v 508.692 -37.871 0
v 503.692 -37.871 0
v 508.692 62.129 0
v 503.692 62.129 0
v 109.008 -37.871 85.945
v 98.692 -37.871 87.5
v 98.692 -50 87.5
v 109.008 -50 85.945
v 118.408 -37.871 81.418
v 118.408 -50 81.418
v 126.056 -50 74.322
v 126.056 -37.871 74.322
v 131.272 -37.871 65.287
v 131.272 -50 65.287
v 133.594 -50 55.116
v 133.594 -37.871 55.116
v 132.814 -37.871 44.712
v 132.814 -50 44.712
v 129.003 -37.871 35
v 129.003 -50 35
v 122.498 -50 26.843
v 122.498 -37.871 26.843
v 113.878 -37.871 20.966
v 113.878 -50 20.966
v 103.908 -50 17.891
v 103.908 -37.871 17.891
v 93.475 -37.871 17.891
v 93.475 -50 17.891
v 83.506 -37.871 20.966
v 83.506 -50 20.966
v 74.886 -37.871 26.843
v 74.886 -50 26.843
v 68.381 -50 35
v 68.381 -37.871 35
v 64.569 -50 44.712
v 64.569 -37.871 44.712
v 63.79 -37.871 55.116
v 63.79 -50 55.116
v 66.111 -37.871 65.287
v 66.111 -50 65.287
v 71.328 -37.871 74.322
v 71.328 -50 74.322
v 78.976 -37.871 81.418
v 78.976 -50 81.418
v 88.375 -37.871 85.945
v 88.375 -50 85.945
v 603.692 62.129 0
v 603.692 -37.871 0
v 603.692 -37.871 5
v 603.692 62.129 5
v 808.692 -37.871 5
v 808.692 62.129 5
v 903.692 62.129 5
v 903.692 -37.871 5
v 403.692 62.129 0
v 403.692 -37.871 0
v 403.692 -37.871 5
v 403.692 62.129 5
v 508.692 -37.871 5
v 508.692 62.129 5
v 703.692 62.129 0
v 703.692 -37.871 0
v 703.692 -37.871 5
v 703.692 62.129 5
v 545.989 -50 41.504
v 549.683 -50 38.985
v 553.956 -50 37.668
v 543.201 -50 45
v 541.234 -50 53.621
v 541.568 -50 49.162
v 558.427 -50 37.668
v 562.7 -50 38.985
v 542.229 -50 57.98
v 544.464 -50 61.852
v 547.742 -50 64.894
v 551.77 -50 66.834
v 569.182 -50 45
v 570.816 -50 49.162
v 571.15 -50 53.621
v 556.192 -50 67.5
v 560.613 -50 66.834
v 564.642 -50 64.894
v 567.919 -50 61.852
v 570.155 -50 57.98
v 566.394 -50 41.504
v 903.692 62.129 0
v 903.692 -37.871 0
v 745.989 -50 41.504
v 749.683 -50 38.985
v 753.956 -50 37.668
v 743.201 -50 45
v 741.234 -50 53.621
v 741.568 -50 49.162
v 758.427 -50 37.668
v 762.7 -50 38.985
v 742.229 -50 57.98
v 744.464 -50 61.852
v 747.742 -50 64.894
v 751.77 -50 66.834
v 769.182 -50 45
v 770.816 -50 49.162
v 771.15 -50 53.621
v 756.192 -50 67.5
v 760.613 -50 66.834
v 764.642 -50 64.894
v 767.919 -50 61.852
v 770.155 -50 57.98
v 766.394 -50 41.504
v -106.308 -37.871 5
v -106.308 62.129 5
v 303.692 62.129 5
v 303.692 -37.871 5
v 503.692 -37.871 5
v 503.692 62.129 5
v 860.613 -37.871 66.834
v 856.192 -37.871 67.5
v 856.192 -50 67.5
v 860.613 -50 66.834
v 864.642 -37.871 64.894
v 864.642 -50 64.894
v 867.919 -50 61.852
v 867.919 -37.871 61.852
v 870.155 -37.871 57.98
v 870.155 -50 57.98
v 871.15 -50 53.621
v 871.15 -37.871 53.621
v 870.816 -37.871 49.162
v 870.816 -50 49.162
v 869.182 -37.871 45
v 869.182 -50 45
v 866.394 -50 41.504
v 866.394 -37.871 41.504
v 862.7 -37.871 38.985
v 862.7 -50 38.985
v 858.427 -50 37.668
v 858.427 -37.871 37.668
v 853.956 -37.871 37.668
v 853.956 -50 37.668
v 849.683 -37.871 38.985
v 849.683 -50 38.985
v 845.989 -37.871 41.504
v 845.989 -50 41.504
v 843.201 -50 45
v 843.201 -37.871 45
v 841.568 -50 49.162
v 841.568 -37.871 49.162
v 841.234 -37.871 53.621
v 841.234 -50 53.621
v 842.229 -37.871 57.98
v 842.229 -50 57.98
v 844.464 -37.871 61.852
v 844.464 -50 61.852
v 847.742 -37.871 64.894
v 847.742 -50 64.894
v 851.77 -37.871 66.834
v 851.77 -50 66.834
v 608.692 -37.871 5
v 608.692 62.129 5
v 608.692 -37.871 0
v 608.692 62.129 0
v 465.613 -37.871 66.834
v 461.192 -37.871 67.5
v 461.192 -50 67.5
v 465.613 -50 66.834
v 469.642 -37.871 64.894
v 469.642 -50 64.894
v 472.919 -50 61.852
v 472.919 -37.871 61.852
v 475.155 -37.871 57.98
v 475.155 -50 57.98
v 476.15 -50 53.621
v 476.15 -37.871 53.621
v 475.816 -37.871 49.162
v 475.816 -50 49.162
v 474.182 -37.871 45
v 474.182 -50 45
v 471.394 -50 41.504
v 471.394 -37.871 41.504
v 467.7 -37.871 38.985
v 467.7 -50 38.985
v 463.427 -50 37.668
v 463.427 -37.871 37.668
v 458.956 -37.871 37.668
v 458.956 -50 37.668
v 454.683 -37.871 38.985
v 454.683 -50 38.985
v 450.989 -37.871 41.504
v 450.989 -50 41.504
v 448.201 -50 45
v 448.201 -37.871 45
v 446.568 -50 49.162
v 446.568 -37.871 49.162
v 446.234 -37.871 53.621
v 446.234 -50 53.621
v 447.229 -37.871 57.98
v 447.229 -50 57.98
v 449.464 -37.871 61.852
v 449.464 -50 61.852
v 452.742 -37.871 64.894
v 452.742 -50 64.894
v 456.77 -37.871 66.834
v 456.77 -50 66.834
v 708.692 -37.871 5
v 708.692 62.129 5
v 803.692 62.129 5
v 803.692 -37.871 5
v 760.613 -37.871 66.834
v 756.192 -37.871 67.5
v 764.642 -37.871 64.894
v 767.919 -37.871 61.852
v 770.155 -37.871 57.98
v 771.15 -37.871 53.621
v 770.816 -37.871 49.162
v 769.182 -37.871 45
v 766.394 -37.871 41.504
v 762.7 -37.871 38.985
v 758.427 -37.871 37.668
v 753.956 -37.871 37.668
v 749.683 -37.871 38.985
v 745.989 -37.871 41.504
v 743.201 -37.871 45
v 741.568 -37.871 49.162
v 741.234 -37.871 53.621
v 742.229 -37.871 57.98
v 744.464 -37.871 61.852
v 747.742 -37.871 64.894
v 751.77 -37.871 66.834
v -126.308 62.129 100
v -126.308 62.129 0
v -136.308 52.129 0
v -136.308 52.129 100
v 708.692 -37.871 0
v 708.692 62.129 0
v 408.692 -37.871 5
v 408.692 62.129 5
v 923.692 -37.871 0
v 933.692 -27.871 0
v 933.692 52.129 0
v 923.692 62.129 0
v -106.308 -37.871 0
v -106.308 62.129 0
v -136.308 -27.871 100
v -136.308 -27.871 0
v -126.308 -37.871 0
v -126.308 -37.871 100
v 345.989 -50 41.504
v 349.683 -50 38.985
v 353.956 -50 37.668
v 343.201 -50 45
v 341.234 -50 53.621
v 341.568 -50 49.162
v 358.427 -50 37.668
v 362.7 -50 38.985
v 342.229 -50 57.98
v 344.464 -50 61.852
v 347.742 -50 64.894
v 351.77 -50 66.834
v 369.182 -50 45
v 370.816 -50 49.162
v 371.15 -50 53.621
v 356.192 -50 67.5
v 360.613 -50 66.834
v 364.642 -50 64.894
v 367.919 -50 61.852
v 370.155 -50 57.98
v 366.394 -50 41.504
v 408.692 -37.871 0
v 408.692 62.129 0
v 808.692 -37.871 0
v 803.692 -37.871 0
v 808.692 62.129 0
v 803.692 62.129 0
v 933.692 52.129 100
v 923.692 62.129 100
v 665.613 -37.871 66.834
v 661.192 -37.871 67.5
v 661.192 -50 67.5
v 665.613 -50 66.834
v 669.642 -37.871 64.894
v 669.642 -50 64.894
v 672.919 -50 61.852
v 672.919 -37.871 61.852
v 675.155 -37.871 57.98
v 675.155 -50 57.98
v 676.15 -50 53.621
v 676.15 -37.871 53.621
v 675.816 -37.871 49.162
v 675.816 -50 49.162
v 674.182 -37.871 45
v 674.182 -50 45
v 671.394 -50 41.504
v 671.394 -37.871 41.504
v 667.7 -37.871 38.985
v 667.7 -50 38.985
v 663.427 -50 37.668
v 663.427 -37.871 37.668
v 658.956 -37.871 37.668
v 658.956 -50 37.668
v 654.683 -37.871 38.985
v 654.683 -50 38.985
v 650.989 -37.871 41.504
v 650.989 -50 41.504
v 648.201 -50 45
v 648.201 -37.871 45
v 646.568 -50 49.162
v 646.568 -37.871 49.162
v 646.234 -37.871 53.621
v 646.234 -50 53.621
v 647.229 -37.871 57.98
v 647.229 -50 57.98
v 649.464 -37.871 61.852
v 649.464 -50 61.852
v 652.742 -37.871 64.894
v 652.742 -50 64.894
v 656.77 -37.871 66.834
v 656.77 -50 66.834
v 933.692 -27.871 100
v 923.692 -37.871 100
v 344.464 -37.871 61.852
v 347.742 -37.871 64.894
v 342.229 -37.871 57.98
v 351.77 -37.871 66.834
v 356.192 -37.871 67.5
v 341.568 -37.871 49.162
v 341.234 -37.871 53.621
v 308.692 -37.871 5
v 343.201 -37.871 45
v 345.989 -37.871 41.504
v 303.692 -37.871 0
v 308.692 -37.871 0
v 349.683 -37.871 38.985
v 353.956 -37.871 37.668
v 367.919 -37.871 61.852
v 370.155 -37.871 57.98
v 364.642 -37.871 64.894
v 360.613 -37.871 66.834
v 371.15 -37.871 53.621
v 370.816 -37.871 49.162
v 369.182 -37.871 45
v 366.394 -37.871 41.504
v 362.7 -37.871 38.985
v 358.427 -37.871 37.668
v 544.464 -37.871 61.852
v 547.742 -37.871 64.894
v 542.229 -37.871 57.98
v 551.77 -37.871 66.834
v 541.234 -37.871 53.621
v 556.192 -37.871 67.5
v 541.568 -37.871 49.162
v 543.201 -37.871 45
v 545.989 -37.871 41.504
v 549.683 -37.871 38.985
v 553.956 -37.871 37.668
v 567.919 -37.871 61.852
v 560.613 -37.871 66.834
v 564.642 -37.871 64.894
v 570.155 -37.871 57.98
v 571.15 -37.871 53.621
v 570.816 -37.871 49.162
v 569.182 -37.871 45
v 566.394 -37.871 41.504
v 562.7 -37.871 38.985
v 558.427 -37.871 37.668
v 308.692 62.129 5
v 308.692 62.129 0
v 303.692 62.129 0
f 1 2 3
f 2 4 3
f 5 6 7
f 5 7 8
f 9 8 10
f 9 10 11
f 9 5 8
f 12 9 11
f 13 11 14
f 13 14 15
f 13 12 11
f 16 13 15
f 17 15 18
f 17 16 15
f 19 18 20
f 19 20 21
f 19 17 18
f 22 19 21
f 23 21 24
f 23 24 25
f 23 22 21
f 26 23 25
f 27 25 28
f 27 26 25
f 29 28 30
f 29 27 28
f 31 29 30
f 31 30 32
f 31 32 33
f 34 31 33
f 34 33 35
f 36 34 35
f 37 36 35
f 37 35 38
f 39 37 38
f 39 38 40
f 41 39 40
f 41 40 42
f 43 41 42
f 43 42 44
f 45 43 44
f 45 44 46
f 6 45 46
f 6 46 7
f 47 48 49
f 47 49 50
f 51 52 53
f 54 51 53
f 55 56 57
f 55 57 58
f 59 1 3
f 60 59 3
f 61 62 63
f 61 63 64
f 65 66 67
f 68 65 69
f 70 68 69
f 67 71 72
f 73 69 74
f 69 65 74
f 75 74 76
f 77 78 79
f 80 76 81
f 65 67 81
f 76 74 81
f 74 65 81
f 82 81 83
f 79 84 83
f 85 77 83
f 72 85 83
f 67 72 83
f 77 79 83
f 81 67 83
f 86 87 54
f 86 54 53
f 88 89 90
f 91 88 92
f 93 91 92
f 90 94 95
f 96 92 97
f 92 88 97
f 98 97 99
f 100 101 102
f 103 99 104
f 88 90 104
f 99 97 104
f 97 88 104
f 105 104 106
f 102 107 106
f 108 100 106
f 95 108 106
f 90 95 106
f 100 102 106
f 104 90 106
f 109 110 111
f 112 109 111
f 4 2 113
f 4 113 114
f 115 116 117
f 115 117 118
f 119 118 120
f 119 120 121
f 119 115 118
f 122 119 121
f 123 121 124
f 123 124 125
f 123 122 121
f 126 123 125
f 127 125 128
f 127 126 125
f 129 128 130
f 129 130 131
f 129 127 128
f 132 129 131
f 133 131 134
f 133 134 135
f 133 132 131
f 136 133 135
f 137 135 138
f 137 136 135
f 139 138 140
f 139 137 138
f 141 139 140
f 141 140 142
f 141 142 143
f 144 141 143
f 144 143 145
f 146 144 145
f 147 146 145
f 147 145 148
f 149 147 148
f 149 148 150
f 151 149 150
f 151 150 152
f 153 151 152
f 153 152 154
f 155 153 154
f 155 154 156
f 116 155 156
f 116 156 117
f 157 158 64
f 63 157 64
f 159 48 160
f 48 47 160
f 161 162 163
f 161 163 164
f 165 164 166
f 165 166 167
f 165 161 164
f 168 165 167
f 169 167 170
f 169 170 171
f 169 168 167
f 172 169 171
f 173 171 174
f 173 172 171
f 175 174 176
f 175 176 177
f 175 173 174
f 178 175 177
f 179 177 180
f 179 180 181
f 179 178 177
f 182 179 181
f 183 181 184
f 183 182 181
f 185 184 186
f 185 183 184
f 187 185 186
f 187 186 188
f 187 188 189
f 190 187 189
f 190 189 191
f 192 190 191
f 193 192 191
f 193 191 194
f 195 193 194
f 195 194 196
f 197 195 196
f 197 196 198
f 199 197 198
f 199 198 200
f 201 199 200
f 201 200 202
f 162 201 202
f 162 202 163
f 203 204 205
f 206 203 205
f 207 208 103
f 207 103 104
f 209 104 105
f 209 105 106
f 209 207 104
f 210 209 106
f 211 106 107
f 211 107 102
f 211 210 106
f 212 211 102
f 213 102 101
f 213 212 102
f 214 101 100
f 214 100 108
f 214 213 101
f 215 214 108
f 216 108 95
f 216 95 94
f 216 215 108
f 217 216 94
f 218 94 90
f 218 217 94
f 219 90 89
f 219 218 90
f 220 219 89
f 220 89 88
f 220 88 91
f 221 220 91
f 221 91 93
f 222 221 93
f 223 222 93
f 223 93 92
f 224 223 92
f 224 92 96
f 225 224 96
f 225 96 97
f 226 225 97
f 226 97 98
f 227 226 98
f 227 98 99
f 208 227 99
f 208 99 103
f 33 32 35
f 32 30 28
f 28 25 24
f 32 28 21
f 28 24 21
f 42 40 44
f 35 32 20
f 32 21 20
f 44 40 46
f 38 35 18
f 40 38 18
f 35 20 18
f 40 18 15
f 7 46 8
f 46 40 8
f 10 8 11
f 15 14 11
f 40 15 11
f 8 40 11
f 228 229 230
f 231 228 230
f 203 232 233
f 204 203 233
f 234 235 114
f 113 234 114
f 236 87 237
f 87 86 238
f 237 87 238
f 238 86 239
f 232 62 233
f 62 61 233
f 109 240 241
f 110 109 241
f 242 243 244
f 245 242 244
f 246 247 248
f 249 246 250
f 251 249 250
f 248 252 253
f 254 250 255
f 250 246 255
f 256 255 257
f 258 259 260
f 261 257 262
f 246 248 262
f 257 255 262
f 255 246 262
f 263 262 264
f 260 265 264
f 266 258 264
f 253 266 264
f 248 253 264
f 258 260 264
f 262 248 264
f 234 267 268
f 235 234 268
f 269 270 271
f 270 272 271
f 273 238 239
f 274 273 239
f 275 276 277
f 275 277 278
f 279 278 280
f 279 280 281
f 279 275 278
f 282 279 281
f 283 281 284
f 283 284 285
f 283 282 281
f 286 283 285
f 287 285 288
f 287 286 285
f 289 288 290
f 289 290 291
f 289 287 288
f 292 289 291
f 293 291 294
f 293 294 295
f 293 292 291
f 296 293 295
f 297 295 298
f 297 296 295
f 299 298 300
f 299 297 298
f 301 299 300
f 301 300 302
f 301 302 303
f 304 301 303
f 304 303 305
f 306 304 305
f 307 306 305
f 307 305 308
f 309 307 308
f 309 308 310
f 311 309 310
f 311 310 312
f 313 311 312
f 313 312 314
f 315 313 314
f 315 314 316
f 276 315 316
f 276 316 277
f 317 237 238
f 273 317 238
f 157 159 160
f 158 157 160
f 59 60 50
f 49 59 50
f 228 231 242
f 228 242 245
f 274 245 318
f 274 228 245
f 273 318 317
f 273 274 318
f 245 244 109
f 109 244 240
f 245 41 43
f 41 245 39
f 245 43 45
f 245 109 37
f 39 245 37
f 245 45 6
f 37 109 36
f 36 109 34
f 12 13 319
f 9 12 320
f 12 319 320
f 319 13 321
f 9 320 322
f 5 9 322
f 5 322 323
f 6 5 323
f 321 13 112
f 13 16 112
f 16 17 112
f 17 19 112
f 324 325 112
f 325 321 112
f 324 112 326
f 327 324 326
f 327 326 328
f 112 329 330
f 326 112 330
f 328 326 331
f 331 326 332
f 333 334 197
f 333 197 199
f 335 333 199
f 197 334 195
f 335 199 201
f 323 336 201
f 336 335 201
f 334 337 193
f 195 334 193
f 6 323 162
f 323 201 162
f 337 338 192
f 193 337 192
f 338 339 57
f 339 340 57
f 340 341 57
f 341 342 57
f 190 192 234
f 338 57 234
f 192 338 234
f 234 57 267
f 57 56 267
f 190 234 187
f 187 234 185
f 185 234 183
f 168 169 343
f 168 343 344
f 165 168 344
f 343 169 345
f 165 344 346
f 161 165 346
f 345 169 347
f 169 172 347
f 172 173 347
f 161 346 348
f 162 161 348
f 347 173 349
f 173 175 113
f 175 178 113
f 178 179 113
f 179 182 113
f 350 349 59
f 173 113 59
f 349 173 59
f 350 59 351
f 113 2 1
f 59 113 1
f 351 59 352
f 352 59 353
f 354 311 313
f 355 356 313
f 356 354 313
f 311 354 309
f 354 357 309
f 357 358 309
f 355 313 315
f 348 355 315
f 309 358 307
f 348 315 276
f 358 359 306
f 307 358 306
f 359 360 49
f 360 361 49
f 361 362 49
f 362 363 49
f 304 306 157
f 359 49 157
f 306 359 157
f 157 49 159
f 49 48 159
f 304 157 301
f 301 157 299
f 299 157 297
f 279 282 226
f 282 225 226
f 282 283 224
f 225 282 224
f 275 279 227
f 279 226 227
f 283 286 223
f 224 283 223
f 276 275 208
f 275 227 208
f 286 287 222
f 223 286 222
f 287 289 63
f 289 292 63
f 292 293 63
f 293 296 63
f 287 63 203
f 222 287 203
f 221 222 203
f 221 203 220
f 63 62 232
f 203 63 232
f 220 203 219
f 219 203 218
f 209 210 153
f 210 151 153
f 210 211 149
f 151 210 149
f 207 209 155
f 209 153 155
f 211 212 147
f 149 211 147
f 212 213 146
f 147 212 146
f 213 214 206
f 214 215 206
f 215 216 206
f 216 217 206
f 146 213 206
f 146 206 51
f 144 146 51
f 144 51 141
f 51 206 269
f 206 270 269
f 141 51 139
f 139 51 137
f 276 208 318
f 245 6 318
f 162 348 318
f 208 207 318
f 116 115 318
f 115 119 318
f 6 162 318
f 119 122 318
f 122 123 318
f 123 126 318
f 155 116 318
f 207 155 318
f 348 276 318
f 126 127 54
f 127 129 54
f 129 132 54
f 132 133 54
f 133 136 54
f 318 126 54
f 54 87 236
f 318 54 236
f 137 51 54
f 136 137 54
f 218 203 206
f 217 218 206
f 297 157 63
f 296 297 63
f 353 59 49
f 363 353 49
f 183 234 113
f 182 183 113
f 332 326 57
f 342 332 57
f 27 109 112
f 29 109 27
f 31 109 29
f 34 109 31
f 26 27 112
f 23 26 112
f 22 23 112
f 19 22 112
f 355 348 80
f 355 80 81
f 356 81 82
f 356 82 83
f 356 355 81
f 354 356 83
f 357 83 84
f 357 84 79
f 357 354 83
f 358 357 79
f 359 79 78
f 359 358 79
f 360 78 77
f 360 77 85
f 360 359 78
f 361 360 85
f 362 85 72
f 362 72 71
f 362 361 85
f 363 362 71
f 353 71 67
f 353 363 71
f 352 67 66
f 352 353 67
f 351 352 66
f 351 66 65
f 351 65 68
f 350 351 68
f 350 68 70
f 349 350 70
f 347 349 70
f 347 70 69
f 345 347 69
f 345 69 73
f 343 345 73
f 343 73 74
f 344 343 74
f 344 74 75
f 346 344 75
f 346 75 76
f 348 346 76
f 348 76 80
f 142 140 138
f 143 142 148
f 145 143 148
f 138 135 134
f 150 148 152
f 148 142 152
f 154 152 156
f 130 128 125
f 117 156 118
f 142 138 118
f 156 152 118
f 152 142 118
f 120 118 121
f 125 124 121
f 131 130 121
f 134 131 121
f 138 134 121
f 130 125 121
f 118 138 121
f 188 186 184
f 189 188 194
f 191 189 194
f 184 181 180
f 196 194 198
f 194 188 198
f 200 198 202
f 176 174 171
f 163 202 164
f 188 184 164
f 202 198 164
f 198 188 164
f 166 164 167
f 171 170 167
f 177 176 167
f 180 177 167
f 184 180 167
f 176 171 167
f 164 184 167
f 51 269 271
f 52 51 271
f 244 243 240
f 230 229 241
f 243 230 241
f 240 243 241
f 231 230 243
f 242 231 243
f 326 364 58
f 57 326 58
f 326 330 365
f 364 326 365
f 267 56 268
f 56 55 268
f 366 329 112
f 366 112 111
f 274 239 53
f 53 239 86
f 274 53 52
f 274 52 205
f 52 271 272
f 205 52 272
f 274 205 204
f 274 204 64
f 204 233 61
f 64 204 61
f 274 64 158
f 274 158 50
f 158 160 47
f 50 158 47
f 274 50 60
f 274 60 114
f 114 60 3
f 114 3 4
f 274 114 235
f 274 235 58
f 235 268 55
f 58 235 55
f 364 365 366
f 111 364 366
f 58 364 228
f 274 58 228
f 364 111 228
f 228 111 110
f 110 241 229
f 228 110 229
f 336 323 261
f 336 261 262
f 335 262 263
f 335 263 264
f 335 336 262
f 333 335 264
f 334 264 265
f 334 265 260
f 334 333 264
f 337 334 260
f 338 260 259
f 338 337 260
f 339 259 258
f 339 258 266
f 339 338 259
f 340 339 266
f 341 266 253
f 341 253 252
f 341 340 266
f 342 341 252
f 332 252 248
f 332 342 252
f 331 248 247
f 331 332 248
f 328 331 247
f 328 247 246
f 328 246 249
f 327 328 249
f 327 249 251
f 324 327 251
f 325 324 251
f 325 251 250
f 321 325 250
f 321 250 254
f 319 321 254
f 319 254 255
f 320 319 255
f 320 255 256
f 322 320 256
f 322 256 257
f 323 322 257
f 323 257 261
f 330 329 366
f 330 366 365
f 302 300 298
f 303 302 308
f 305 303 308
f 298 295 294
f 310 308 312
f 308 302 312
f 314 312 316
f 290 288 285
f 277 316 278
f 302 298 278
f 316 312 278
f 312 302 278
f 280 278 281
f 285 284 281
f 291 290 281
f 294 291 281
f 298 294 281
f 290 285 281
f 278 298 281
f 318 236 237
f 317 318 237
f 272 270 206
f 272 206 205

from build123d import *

# Parameters (mm, degrees)
CROQUIS1_W              = 100
CROQUIS1_H              = 100
SALIENTE_EXTRUIR2_DEPTH = 100
CROQUIS2_W              = 410
CROQUIS2_H              = 100
CROQUIS2_W_2            = 95
CORTAR_EXTRUIR2_DEPTH   = 5
CROQUIS3_R              = 15
CROQUIS3_R_2            = 35
SALIENTE_EXTRUIR3_DEPTH = 50


with BuildPart() as part:
    # Croquis1 → Saliente-Extruir2 (new body)
    with BuildSketch(Plane.XY):
        Polygon((793.691747165, 62.128712871), (793.691747165, -37.871287129), (893.691747165, -37.871287129), (923.691747165, -37.871287129), (933.691747165, -27.871287129), (933.691747165, 52.128712871), (923.691747165, 62.128712871), (893.691747165, 62.128712871), align=None)
        with Locations((743.691747165, 12.128712871)):
            Rectangle(CROQUIS1_W, CROQUIS1_H)
        with Locations((643.691747165, 12.128712871)):
            Rectangle(CROQUIS1_W, CROQUIS1_H)
        with Locations((543.691747165, 12.128712871)):
            Rectangle(CROQUIS1_W, CROQUIS1_H)
        with Locations((443.691747165, 12.128712871)):
            Rectangle(CROQUIS1_W, CROQUIS1_H)
        with Locations((343.691747165, 12.128712871)):
            Rectangle(CROQUIS1_W, CROQUIS1_H)
        Polygon((-126.308252835, -37.871287129), (-106.308252835, -37.871287129), (293.691747165, -37.871287129), (293.691747165, 62.128712871), (-106.308252835, 62.128712871), (-126.308252835, 62.128712871), (-136.308252835, 52.128712871), (-136.308252835, -27.871287129), align=None)
    extrude(amount=SALIENTE_EXTRUIR2_DEPTH)

    # Croquis2 → Cortar-Extruir2 (cut)
    with BuildSketch(Plane.XY):
        with Locations((98.691747165, 12.128712871)):
            Rectangle(CROQUIS2_W, CROQUIS2_H)
        with Locations((856.191747165, 12.128712871)):
            Rectangle(CROQUIS2_W_2, CROQUIS2_H)
        with Locations((756.191747165, 12.128712871)):
            Rectangle(CROQUIS2_W_2, CROQUIS2_H)
        with Locations((656.191747165, 12.128712871)):
            Rectangle(CROQUIS2_W_2, CROQUIS2_H)
        with Locations((556.191747165, 12.128712871)):
            Rectangle(CROQUIS2_W_2, CROQUIS2_H)
        with Locations((456.191747165, 12.128712871)):
            Rectangle(CROQUIS2_W_2, CROQUIS2_H)
        with Locations((356.191747165, 12.128712871)):
            Rectangle(CROQUIS2_W_2, CROQUIS2_H)
    extrude(amount=CORTAR_EXTRUIR2_DEPTH, mode=Mode.SUBTRACT)

    # Croquis3 → Saliente-Extruir3 (add)
    with BuildSketch(Plane(origin=(0, 0, 0), x_dir=(1, 0, 0), z_dir=(0, 1, 0))):
        with Locations(Location((856.191747165, -52.5, 0), (0, 0, 270))):
            Circle(CROQUIS3_R)
        with Locations(Location((756.191747165, -52.5, 0), (0, 0, 270))):
            Circle(CROQUIS3_R)
        with Locations(Location((661.191747165, -52.5, 0), (0, 0, 270))):
            Circle(CROQUIS3_R)
        with Locations(Location((556.191747165, -52.5, 0), (0, 0, 270))):
            Circle(CROQUIS3_R)
        with Locations(Location((461.191747165, -52.5, 0), (0, 0, 270))):
            Circle(CROQUIS3_R)
        with Locations(Location((356.191747165, -52.5, 0), (0, 0, 270))):
            Circle(CROQUIS3_R)
        with Locations(Location((98.691747165, -52.5, 0), (0, 0, 270))):
            Circle(CROQUIS3_R_2)
    extrude(amount=-SALIENTE_EXTRUIR3_DEPTH)


solid = part.part
